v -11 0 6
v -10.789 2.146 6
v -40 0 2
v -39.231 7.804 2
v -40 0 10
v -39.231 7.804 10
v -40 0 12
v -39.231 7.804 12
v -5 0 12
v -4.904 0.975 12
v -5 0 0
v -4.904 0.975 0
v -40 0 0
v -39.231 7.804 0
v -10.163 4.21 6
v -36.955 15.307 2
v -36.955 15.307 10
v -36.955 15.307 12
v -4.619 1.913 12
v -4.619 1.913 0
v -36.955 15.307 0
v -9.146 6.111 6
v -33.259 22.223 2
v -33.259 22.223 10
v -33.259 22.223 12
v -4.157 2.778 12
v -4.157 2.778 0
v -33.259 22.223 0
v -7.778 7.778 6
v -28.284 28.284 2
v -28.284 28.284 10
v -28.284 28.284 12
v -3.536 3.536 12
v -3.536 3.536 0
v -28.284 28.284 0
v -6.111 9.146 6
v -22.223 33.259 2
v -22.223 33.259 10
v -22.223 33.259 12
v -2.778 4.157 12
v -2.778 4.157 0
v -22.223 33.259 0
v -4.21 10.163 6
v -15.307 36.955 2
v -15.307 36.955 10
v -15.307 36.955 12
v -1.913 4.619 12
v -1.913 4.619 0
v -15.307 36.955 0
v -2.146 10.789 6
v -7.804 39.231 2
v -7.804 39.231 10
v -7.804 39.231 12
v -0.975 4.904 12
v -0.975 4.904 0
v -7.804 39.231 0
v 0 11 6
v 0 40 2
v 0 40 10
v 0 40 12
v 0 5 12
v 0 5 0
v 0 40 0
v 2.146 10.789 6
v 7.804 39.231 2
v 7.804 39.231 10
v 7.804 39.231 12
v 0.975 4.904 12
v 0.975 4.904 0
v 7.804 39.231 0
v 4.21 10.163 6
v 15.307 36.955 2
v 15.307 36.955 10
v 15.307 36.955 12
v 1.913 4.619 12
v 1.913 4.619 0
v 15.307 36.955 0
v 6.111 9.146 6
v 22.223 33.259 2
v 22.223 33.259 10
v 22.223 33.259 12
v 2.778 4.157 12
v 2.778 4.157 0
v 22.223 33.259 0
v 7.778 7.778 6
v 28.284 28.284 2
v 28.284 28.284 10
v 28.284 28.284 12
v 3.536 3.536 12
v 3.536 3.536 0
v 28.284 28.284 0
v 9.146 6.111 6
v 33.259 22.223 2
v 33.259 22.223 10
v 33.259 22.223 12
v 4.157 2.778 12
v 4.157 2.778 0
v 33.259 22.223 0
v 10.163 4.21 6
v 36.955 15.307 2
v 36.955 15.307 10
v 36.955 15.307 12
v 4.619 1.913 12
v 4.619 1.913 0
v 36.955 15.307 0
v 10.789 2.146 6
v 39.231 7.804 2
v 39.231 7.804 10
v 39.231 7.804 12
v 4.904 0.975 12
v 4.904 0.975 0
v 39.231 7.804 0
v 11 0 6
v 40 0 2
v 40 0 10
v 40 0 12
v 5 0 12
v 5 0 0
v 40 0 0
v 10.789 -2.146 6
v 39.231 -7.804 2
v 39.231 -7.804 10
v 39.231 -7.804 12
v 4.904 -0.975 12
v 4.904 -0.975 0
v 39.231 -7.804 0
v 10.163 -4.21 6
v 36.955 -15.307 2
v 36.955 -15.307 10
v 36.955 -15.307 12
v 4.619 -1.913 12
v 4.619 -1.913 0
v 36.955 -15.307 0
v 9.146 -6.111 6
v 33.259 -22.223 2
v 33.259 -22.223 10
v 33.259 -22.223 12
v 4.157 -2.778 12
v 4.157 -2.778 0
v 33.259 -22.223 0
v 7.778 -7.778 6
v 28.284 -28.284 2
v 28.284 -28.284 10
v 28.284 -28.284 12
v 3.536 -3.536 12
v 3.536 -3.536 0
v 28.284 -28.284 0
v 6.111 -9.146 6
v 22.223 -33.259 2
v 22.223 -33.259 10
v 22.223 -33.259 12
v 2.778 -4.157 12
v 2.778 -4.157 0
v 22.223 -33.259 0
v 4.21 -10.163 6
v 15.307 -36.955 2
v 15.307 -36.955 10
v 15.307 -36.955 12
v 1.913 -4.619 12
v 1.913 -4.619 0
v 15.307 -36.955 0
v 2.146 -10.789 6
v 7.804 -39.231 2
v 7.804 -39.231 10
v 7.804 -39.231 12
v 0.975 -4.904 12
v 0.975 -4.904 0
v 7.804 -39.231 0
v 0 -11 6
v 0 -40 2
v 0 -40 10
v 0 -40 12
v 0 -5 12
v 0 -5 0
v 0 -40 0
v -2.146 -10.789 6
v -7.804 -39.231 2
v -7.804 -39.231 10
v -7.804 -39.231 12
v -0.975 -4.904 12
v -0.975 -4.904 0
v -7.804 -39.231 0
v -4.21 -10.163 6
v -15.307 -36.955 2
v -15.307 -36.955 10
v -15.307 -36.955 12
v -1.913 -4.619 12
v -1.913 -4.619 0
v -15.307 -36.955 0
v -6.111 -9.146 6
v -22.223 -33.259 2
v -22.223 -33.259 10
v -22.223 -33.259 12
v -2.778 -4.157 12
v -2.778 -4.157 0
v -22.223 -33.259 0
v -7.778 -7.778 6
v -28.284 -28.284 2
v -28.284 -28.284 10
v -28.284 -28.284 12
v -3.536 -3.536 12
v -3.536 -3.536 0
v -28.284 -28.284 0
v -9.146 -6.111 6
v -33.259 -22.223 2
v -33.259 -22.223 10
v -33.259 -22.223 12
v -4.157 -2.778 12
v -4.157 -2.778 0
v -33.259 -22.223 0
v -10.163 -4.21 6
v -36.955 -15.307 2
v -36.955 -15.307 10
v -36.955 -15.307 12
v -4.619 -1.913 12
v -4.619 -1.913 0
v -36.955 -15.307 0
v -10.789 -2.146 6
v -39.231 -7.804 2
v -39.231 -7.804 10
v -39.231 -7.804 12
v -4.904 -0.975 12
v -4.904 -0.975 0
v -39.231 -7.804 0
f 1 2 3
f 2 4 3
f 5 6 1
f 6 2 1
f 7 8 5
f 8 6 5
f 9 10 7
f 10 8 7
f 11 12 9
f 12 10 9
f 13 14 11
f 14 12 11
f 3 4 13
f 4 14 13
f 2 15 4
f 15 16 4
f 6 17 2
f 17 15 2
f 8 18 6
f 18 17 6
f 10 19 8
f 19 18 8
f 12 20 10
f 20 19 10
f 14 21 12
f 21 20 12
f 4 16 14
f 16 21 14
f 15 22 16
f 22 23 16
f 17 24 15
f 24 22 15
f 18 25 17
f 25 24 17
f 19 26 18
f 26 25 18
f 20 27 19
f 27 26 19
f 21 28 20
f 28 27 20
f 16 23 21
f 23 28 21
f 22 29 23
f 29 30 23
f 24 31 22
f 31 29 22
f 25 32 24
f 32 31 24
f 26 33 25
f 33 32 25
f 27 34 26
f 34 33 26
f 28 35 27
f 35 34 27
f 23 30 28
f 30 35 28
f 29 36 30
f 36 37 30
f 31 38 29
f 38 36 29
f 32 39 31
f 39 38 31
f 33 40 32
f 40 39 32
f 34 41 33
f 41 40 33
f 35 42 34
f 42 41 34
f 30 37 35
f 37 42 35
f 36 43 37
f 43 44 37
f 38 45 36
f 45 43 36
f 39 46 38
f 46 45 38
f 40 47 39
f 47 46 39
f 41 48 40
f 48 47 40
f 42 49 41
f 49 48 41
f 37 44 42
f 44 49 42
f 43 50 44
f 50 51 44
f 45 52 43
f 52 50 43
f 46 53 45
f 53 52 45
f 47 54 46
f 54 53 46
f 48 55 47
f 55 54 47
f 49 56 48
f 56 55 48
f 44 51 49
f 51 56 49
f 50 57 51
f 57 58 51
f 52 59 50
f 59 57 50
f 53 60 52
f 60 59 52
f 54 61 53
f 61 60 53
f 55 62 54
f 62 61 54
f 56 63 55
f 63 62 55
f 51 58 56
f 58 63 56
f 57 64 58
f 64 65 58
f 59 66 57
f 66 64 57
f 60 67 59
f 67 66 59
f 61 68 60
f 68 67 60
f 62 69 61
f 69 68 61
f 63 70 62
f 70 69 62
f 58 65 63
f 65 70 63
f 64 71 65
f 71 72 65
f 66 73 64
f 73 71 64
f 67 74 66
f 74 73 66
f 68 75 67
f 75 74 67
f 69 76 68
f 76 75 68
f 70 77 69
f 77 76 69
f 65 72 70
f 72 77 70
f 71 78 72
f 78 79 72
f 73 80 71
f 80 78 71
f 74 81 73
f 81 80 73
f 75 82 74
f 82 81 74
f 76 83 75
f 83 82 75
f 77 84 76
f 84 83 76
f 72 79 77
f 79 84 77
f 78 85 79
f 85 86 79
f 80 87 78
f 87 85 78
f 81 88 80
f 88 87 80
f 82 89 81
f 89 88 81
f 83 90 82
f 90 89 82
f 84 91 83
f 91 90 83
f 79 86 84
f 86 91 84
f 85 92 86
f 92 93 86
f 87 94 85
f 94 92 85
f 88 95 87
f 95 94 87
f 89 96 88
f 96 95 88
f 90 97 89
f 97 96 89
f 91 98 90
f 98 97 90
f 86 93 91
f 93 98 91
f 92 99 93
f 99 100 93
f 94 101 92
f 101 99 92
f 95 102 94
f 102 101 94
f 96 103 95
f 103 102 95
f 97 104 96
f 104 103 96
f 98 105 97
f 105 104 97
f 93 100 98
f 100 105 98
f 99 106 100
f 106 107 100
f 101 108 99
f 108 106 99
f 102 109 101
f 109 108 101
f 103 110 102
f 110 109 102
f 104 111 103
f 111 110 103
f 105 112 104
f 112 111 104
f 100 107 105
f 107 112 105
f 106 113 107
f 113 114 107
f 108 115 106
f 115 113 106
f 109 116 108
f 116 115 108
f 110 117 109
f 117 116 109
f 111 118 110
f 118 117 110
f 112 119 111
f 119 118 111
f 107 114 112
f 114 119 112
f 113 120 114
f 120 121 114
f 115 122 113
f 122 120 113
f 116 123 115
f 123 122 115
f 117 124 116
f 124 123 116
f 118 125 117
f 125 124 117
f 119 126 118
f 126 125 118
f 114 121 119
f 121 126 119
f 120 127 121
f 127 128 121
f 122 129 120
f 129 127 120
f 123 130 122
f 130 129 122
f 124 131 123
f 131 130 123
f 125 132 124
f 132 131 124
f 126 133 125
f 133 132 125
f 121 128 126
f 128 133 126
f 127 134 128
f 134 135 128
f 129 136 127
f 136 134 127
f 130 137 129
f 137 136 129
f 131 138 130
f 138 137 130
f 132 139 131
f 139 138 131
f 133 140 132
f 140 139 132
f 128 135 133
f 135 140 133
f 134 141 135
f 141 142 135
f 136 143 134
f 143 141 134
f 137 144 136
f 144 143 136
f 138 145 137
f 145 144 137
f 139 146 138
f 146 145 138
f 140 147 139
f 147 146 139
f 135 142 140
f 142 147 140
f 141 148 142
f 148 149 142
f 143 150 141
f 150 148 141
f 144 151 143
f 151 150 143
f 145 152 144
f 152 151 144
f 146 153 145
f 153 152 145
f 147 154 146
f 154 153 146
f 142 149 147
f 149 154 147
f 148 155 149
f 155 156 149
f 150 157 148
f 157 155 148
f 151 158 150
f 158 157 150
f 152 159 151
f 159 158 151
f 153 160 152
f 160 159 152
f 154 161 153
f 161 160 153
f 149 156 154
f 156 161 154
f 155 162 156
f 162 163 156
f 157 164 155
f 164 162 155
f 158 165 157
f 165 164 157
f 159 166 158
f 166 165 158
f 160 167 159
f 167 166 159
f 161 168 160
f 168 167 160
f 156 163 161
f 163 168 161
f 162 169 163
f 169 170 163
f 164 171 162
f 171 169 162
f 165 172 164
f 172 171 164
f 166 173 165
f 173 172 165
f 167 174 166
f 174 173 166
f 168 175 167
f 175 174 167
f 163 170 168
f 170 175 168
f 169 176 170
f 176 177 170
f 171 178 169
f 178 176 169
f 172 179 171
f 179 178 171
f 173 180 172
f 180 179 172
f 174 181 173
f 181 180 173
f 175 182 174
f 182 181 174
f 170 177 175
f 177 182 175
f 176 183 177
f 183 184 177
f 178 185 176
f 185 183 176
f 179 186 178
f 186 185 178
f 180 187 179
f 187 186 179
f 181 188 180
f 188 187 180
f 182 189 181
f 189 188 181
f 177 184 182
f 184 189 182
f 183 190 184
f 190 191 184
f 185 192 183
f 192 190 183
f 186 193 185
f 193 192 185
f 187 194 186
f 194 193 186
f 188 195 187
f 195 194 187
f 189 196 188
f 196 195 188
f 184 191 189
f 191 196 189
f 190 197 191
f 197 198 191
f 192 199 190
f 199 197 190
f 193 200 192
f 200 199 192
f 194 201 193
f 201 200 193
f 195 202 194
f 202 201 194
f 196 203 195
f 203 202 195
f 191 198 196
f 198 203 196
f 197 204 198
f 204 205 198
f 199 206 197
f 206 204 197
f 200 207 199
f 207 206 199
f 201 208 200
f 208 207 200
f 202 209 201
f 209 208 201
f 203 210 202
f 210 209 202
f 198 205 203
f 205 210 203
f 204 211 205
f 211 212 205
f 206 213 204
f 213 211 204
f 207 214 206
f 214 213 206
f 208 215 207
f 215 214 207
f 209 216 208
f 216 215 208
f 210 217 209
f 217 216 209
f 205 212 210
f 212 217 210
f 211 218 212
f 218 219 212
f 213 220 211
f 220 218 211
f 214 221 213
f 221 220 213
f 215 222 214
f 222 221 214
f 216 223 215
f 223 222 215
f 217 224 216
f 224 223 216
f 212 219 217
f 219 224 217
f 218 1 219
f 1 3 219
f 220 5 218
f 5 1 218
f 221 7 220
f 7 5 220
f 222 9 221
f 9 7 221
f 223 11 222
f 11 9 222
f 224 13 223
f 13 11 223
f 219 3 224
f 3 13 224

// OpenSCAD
$fn = 32;

// ----------------------------------------------------------------------
// Revolved part: V-groove pulley R40
// ----------------------------------------------------------------------

// --- parameters (mm) ---
bore_r = 5;               // bore radius
rim_r = 40;               // rim radius
rim_t = 12;               // rim width
groove_r = 11;            // groove root radius
groove_w = 4;             // groove half width
revolve_angle = 360;      // revolve sweep, degrees

bore_d = 2 * bore_r;
rim_d = 2 * rim_r;
groove_d = 2 * groove_r;

profile = [[5, 0], [40, 0], [40, 2], [11, 6], [40, 10], [40, 12], [5, 12]];  // primary outline, 7 points, counter clockwise

// --- the one profile operation ---
rotate_extrude(angle = revolve_angle) polygon(points = profile);
